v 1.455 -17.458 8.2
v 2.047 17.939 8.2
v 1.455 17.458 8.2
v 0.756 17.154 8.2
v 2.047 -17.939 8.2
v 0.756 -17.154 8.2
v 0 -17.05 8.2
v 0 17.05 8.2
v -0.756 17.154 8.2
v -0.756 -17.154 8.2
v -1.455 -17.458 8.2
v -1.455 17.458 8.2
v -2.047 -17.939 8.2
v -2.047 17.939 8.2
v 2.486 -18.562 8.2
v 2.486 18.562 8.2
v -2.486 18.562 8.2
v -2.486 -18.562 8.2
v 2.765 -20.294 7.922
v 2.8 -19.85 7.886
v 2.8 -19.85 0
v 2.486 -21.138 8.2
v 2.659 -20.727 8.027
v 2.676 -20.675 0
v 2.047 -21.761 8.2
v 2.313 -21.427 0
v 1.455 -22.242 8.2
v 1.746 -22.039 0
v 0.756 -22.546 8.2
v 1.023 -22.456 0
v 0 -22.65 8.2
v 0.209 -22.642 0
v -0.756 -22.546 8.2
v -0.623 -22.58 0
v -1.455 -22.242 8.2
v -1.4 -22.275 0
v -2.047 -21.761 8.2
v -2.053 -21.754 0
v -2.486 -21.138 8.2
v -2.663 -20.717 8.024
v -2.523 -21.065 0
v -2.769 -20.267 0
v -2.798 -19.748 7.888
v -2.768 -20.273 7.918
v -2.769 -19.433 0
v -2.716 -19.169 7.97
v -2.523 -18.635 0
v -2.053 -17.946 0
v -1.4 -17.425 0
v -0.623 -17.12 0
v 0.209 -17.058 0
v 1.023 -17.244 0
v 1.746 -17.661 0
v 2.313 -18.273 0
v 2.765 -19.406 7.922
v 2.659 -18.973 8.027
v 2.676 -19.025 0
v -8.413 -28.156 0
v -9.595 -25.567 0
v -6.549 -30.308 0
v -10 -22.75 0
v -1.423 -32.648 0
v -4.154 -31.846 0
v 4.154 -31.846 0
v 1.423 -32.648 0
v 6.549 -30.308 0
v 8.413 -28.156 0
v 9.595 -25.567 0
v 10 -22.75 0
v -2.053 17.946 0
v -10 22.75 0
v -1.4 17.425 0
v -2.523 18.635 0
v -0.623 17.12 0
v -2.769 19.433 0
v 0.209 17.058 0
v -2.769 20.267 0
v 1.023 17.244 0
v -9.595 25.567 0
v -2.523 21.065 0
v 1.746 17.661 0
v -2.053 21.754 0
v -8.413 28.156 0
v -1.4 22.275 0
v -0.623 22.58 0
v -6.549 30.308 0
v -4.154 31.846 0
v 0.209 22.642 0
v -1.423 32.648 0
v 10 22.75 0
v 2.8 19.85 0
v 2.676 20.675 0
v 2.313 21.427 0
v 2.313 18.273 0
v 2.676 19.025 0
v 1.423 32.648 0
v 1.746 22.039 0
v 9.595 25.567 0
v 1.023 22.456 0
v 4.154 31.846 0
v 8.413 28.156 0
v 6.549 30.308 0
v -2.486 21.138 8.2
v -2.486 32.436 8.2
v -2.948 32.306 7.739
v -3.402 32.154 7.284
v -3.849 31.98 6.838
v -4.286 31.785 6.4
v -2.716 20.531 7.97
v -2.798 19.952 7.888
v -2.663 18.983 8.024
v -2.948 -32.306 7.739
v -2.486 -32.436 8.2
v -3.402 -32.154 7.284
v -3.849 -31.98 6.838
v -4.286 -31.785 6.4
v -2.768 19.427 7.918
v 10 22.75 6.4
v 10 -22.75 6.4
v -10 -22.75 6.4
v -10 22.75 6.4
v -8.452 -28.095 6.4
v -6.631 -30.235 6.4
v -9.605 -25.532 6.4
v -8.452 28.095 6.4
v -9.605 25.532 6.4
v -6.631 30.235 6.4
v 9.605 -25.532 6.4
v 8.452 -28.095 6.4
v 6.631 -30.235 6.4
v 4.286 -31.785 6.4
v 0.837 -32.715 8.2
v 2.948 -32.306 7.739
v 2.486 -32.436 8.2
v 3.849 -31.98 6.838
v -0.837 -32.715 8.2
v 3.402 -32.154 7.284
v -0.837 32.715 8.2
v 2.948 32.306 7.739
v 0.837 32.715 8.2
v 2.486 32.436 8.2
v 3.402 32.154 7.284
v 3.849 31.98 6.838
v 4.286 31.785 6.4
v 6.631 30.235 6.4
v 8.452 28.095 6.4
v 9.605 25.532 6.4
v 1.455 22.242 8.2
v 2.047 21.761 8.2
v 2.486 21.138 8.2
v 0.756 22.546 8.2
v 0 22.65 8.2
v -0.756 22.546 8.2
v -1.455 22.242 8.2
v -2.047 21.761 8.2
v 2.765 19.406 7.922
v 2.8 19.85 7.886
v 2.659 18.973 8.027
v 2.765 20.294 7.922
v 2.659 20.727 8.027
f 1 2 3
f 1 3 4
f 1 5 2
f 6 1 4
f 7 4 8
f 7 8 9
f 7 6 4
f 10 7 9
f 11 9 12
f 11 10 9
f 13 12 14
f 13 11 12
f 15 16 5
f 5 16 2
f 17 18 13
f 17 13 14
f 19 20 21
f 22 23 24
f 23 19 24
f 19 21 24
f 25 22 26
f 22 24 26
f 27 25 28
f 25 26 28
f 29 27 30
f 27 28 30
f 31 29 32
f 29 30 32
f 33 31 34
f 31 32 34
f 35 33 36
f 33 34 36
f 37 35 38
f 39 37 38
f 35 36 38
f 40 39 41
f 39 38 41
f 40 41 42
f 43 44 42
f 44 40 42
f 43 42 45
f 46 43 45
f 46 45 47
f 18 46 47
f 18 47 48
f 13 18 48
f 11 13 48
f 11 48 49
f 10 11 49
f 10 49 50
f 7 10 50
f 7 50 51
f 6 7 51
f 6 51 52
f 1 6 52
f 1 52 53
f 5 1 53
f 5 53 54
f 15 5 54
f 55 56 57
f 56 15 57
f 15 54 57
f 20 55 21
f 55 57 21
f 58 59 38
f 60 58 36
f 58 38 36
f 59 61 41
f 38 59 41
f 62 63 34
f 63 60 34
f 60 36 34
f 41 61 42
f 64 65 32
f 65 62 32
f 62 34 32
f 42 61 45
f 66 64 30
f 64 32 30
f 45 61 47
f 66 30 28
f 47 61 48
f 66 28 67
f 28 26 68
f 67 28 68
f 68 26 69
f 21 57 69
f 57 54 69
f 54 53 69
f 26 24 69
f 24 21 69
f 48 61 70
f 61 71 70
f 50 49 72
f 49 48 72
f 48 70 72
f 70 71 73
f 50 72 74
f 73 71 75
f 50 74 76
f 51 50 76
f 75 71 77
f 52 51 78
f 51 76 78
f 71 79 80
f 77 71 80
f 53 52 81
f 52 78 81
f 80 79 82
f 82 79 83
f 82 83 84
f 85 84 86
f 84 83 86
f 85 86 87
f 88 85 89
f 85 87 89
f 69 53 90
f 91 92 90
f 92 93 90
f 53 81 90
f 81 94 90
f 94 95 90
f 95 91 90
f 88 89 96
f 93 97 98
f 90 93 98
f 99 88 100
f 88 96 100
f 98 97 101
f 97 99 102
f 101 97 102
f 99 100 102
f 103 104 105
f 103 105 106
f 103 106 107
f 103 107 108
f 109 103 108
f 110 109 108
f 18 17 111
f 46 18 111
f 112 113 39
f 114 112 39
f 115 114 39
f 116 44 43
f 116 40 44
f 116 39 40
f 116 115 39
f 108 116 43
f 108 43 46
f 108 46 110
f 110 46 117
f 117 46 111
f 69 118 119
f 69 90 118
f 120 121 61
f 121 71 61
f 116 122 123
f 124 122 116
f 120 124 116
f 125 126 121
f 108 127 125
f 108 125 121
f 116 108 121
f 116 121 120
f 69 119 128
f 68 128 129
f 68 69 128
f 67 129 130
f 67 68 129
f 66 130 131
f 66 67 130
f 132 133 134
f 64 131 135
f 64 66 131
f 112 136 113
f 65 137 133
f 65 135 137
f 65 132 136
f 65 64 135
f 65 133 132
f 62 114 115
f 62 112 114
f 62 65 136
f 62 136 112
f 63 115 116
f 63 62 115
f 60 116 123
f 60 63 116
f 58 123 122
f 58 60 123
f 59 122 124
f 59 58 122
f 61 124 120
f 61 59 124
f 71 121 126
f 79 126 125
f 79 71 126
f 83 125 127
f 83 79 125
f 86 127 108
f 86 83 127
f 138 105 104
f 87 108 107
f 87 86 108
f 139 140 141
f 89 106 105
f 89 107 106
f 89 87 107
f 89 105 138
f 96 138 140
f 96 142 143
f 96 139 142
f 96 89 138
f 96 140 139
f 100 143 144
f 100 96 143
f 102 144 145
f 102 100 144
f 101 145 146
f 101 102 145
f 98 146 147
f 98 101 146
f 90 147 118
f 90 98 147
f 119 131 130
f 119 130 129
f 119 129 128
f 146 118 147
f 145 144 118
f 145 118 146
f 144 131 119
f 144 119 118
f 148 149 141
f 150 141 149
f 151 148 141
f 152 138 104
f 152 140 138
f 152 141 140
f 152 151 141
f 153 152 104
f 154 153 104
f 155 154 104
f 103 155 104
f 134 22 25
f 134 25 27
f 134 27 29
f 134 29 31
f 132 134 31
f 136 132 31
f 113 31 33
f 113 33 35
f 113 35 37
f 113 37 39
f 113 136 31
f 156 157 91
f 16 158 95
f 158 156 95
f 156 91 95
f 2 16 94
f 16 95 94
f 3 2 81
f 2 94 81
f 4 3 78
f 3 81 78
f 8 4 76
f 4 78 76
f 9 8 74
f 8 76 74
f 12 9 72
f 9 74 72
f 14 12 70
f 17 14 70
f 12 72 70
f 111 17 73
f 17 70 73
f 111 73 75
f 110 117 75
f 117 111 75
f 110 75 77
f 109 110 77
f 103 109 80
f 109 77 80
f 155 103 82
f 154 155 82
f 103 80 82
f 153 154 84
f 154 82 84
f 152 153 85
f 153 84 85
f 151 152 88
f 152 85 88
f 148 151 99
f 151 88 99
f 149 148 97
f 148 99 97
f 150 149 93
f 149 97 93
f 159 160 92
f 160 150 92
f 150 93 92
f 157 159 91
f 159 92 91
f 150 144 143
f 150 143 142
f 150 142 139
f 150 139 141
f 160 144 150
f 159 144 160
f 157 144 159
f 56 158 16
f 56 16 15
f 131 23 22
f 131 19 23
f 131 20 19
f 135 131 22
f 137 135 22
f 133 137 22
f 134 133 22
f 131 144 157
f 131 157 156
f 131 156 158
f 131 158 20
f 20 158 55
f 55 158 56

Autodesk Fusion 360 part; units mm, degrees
sketch "Sketch1" plane through (0, 0, 0) normal (0, 0, 1) x (1, 0, 0)
  circle A0 centre (0, -19.85) radius 2.8
  circle A1 centre (0, -10) radius 2.55 construction
  circle A2 centre (0, 0) radius 2.55 construction
  circle A3 centre (0, 10) radius 2.55 construction
  circle A4 centre (0, 19.85) radius 2.8
  circle A5 centre (-10, 0) radius 2.55 construction
  circle A6 centre (-10, 19.85) radius 2.55 construction
  circle A7 centre (-10, -19.85) radius 2.55 construction
  circle A8 centre (10, -19.85) radius 2.55 construction
  circle A9 centre (10, 0) radius 2.55 construction
  circle A10 centre (10, 19.85) radius 2.55 construction
  circle A11 centre (-20, -19.85) radius 3.6
  circle A12 centre (-20, 19.85) radius 2.55
  circle A13 centre (20, 19.85) radius 2.55
  circle A14 centre (20, -19.85) radius 3.6
  line L0 (-32.75, 29.75) -> (-32.75, -29.75)
  arc A15 (-32.75, -29.75) -> (-29.75, -32.75) centre (-29.75, -29.75) ccw
  line L1 (0, -32.75) -> (0, -32.75)
  arc A16 (-29.75, 32.75) -> (-32.75, 29.75) centre (-29.75, 29.75) ccw
  line L2 (0, 32.75) -> (0, 32.75)
  arc A17 (32.75, 29.75) -> (29.75, 32.75) centre (29.75, 29.75) ccw
  line L3 (32.75, -29.75) -> (32.75, 29.75)
  arc A18 (29.75, -32.75) -> (32.75, -29.75) centre (29.75, -29.75) ccw
  line L4 (26.2, -23.4) -> (26.2, -16.9)
  line L5 (29.2, -16.9) -> (29.2, -23.4)
  line L6 (29.2, 3.25) -> (29.2, -3.25)
  line L7 (26.2, -3.25) -> (26.2, 3.25)
  line L8 (26.2, 16.9) -> (26.2, 23.4)
  line L9 (29.2, 23.4) -> (29.2, 16.9)
  arc A19 (29.2, 23.4) -> (26.2, 23.4) centre (27.7, 23.4) ccw
  arc A20 (26.2, 16.9) -> (29.2, 16.9) centre (27.7, 16.9) ccw
  arc A21 (29.2, 3.25) -> (26.2, 3.25) centre (27.7, 3.25) ccw
  arc A22 (26.2, -3.25) -> (29.2, -3.25) centre (27.7, -3.25) ccw
  arc A23 (29.2, -16.9) -> (26.2, -16.9) centre (27.7, -16.9) ccw
  arc A24 (26.2, -23.4) -> (29.2, -23.4) centre (27.7, -23.4) ccw
  arc A25 (17.5, -10.32) -> (22.5, -10.32) centre (20, -10.32) ccw
  arc A26 (22.5, 10.32) -> (17.5, 10.32) centre (20, 10.32) ccw
  line L10 (17.5, -10.32) -> (17.5, 10.32)
  line L11 (22.5, 10.32) -> (22.5, -10.32)
  arc A27 (-17.5, 10.32) -> (-22.5, 10.32) centre (-20, 10.32) ccw
  arc A28 (-22.5, -10.32) -> (-17.5, -10.32) centre (-20, -10.32) ccw
  line L12 (-17.5, 10.32) -> (-17.5, -10.32)
  line L13 (-22.5, -10.32) -> (-22.5, 10.32)
  arc A29 (-26.2, 3.25) -> (-29.2, 3.25) centre (-27.7, 3.25) ccw
  arc A30 (-29.2, -3.25) -> (-26.2, -3.25) centre (-27.7, -3.25) ccw
  line L14 (-29.2, -3.25) -> (-29.2, 3.25)
  line L15 (-26.2, 3.25) -> (-26.2, -3.25)
  arc A31 (-26.2, -16.9) -> (-29.2, -16.9) centre (-27.7, -16.9) ccw
  arc A32 (-29.2, -23.4) -> (-26.2, -23.4) centre (-27.7, -23.4) ccw
  line L16 (-26.2, -16.9) -> (-26.2, -23.4)
  line L17 (-29.2, -23.4) -> (-29.2, -16.9)
  arc A33 (-29.2, 16.9) -> (-26.2, 16.9) centre (-27.7, 16.9) ccw
  arc A34 (-26.2, 23.4) -> (-29.2, 23.4) centre (-27.7, 23.4) ccw
  line L18 (-29.2, 16.9) -> (-29.2, 23.4)
  line L19 (-26.2, 23.4) -> (-26.2, 16.9)
  line L20 (0, 32.75) -> (0, -32.75) construction
  line L21 (-10, 32.75) -> (-10, -32.75)
  line L22 (10, 32.75) -> (10, -32.75)
  arc A35 (-9.9939, -22.4) -> (9.9939, -22.4) centre (0, -22.75) ccw
  arc A36 (9.9939, 22.4) -> (-9.9939, 22.4) centre (0, 22.75) ccw
  line L23 (-29.75, -32.75) -> (29.75, -32.75)
  line L24 (-29.75, 32.75) -> (29.75, 32.75)
  dimension "d3" = 5.6
  dimension "d4" = 5.6
sketch "Sketch2" plane through (0, 0, 0) normal (0, 1, 0) x (1, 0, 0)
  line L0 (4.2864, -6.4) -> (-4.2864, -6.4)
  line L1 (4.2864, -6.4) -> (2.4864, -8.2)
  line L2 (2.4864, -24.6) -> (-2.4864, -24.6)
  line L3 (-2.4864, -8.2) -> (-4.2864, -6.4)
  circle A0 centre (0, -16.4) radius 2.1 construction
  line L4 (2.4864, -8.2) -> (-2.4864, -8.2)
  line L5 (4.2864, -26.4) -> (2.4864, -24.6)
  line L6 (4.2864, -26.4) -> (-4.2864, -26.4)
  line L7 (-2.4864, -24.6) -> (-4.2864, -26.4)
  line L8 (3.9, -19.24) -> (3.9, -13.56) construction
  line L9 (-6.56, -21.9) -> (-8.2, -21.9) construction
  line L10 (8.2, -19.24) -> (8.2, -21.9) construction
  line L11 (-3.9, -13.56) -> (-3.9, -19.24) construction
  line L12 (8.2, -21.9) -> (6.56, -21.9) construction
  line L13 (-5.5, -24.6) -> (-5.5, -22.96) construction
  line L14 (2.84, -12.5) -> (-2.84, -12.5) construction
  line L15 (10, -26.4) -> (10, -21.04) construction
  line L16 (6.56, -10.9) -> (8.2, -10.9) construction
  line L17 (6.56, -21.9) -> (3.9, -19.24) construction
  line L18 (5.5, -24.6) -> (2.84, -24.6) construction
  line L19 (-2.84, -12.5) -> (-5.5, -9.84) construction
  line L20 (-2.84, -24.6) -> (-5.5, -24.6) construction
  line L21 (-3.9, -19.24) -> (-6.56, -21.9) construction
  line L22 (-6.56, -10.9) -> (-3.9, -13.56) construction
  line L23 (-5.5, -22.96) -> (-2.84, -20.3) construction
  line L24 (-10, -26.4) -> (-4.64, -26.4) construction
  line L25 (-5.5, -8.2) -> (-2.84, -8.2) construction
  line L26 (-4.64, -6.4) -> (-10, -6.4) construction
  line L27 (-8.2, -13.56) -> (-8.2, -10.9) construction
  line L28 (5.5, -9.84) -> (2.84, -12.5) construction
  line L29 (-8.2, -10.9) -> (-6.56, -10.9) construction
  line L30 (-10, -6.4) -> (-10, -11.76) construction
  line L31 (5.5, -8.2) -> (5.5, -9.84) construction
  line L32 (-10, -11.76) -> (-8.2, -13.56) construction
  line L33 (10, -21.04) -> (8.2, -19.24) construction
  line L34 (-2.84, -20.3) -> (2.84, -20.3) construction
  line L35 (-8.2, -19.24) -> (-10, -21.04) construction
  line L36 (-8.2, -21.9) -> (-8.2, -19.24) construction
  line L37 (2.84, -8.2) -> (5.5, -8.2) construction
  line L38 (-10, -21.04) -> (-10, -26.4) construction
  line L39 (8.2, -10.9) -> (8.2, -13.56) construction
  line L40 (2.84, -24.6) -> (4.64, -26.4) construction
  line L41 (-5.5, -9.84) -> (-5.5, -8.2) construction
  line L42 (3.9, -13.56) -> (6.56, -10.9) construction
  line L43 (4.64, -26.4) -> (10, -26.4) construction
  line L44 (10, -6.4) -> (4.64, -6.4) construction
  line L45 (5.5, -22.96) -> (5.5, -24.6) construction
  line L46 (2.84, -20.3) -> (5.5, -22.96) construction
  line L47 (-4.64, -26.4) -> (-2.84, -24.6) construction
  line L48 (10, -11.76) -> (10, -6.4) construction
  line L49 (-2.84, -8.2) -> (-4.64, -6.4) construction
  line L50 (8.2, -13.56) -> (10, -11.76) construction
  line L51 (4.64, -6.4) -> (2.84, -8.2) construction
extrude "Extrude1" add sketch "Sketch1" along normal blind 6.4 contours L21 L22 A35 A36
extrude "Extrude2" add sketch "Sketch2" along normal mid plane 65.5 contours L0 L1 L3 L4
extrude "Extrude3" cut sketch "Sketch1" along normal through all contours A0 | A4
extrude "Extrude4" cut sketch "Sketch1" along normal through all contours L21 A36 L24 | L21 A35 L23 | L22 A36 L24 | L22 A35 L23
